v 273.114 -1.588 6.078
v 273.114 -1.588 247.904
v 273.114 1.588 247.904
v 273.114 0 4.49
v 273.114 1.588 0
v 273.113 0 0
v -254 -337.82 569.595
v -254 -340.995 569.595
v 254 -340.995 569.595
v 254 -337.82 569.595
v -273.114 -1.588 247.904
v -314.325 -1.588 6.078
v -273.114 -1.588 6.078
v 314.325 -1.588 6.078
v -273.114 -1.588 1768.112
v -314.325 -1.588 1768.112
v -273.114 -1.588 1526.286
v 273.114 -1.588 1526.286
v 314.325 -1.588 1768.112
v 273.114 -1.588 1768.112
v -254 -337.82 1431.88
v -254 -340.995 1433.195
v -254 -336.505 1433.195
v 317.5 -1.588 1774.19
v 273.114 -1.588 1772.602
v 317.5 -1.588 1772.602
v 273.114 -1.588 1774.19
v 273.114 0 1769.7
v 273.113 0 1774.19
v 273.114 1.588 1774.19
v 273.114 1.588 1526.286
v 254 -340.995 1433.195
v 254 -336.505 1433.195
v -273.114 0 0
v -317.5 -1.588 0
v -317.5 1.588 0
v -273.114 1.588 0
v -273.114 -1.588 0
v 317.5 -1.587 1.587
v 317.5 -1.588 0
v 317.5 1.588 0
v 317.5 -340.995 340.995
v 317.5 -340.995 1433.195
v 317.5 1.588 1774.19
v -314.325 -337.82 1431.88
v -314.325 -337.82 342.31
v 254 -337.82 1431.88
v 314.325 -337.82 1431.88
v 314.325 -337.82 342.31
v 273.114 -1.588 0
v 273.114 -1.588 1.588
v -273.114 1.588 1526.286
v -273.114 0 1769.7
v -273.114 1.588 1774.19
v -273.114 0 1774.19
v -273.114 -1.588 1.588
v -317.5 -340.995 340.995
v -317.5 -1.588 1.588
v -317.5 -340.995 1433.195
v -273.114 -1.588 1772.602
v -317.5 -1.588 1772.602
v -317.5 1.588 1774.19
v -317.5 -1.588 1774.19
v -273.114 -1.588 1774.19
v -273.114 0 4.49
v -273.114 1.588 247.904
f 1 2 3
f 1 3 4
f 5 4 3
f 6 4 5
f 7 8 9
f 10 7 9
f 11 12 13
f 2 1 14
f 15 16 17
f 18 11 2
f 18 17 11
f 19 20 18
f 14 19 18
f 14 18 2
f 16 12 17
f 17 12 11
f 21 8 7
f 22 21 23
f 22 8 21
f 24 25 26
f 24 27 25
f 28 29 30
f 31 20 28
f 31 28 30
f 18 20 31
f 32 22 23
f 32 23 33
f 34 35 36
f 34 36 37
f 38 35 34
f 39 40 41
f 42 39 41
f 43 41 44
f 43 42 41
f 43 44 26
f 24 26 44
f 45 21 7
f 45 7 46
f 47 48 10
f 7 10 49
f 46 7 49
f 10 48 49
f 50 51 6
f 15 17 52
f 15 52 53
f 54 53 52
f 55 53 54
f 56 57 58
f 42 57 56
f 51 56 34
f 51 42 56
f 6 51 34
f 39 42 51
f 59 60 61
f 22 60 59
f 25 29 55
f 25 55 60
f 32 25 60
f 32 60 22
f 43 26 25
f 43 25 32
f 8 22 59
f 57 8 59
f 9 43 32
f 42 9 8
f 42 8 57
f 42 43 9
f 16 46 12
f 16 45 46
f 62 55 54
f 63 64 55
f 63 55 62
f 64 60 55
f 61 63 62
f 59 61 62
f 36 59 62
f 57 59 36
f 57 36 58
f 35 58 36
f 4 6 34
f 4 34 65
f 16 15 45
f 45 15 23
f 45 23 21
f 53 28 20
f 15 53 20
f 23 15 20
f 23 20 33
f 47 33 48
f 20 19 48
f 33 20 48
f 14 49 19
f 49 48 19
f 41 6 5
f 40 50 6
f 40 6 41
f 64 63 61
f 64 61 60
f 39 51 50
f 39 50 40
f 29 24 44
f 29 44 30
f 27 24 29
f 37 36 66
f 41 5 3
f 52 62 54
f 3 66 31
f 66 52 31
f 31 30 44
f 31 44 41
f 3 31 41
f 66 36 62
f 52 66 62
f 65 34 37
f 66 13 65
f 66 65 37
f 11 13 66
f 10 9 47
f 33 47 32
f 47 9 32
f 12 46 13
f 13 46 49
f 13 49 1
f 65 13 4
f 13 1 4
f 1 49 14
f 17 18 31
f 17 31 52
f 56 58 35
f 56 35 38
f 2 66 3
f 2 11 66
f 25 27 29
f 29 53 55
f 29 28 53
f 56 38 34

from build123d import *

# Parameters (mm, degrees)
F1_DEPTH = 317.5
F2_T     = -3.175
F4_DEPTH = 1.5875
F5_W     = 508
F5_H     = 863.6
F6_DEPTH = 4.4911280605


with BuildPart() as f1:
    # F0 (on Right) → F1 (new body, symmetric)
    with BuildSketch(Plane.YZ):
        Polygon((-340.995, 340.995), (0, 0), (0, 1774.19), (-340.995, 1433.195), align=None)
    extrude(amount=F1_DEPTH, both=True)

    # F2
    f2_openings = [f1.faces().sort_by_distance(p)[0] for p in [
        (0, 0, 887.095),
    ]]
    offset(amount=F2_T, openings=f2_openings)

    # F3 (on Front) → F4 (join, symmetric)
    with BuildSketch(Plane.XZ):
        Polygon((-273.1135, 247.904), (273.1135, 247.904), (273.1135, 0), (317.5, 0), (317.5, 247.904), (317.5, 1526.286), (317.5, 1774.19), (273.1135, 1774.19), (273.1135, 1526.286), (-273.1135, 1526.286), (-273.1135, 1774.19), (-317.5, 1774.19), (-317.5, 1526.286), (-317.5, 247.904), (-317.5, 0), (-273.1135, 0), align=None)
    extrude(amount=F4_DEPTH, both=True)

    # F5 (on face) → F6 (cut, through all)
    with BuildSketch(Plane.XZ.offset(340.995)):
        with Locations((0, 1001.395)):
            Rectangle(F5_W, F5_H)
    extrude(amount=-F6_DEPTH, mode=Mode.SUBTRACT)


solid = f1.part
